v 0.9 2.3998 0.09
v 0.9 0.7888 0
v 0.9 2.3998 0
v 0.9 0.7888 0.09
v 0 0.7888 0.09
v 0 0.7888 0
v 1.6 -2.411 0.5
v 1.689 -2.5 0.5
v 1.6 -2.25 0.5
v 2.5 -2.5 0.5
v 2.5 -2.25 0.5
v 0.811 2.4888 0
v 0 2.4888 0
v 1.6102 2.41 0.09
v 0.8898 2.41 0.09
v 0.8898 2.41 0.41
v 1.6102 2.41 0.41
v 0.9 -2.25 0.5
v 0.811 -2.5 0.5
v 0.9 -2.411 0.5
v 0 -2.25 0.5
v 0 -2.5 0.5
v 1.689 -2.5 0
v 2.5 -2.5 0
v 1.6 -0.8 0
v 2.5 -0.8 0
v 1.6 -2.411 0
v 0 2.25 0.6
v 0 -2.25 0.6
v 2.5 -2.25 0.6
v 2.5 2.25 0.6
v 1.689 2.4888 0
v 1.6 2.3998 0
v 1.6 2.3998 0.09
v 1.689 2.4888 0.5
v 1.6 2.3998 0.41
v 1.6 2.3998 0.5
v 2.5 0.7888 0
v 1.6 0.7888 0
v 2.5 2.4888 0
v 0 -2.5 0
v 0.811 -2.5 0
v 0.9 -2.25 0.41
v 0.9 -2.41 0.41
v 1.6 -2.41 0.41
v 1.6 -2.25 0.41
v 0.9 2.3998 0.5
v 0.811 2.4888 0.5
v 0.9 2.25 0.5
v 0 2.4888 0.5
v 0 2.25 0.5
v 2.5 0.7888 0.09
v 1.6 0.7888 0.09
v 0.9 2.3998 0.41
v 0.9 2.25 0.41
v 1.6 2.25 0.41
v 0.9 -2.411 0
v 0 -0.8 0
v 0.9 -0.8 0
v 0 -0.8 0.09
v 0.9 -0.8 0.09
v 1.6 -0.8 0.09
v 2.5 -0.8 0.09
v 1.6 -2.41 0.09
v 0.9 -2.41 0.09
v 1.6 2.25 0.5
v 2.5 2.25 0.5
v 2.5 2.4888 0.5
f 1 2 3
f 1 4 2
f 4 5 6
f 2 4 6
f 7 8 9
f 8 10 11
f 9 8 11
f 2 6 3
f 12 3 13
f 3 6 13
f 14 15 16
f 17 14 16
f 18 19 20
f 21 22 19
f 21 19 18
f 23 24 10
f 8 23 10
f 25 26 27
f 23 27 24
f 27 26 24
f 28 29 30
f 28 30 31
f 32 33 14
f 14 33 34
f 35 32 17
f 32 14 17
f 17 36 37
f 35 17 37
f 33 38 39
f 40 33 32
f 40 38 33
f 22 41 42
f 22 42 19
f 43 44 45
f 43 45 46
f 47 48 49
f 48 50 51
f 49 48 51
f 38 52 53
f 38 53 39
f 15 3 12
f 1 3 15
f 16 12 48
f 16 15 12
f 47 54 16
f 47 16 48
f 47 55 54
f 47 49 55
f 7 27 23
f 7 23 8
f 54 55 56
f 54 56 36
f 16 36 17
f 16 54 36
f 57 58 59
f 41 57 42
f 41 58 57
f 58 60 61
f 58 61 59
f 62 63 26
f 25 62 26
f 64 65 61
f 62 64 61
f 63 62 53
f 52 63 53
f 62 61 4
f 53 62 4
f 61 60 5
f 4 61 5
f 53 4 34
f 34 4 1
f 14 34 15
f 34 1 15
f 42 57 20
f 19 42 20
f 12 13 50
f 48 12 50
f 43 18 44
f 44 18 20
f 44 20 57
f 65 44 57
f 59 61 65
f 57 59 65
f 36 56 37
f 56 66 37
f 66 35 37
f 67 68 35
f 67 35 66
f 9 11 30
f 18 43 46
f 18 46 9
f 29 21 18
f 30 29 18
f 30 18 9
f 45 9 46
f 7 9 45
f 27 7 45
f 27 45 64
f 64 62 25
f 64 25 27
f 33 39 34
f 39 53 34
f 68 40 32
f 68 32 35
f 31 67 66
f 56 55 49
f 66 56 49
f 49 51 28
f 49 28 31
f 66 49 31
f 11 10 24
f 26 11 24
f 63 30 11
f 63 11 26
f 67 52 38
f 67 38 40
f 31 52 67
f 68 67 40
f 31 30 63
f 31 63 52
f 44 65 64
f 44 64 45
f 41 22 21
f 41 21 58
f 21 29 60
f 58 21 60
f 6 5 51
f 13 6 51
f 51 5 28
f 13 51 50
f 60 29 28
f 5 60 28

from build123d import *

# Parameters (mm, degrees)
PAD002_DEPTH = 0.9
CHAMFER_SIZE = 0.089
SKETCH001_W  = 4.5
SKETCH001_H  = 0.19
PAD001_DEPTH = 2.5
SKETCH_W     = 4.82
SKETCH_H     = 0.32
PAD_DEPTH    = 2.5


with BuildPart() as body002:
    # Sketch002 → Pad002 (new body)
    with BuildSketch(Plane.YZ):
        Polygon((-2.25, 0.41), (-2.41, 0.41), (-2.41, 0.09), (-0.8, 0.09), (-0.8, 0), (-2.5, 0), (-2.5, 0.5), (-2.25, 0.5), align=None)
    extrude(amount=PAD002_DEPTH)

    # Chamfer
    chamfer_edges = [body002.edges().sort_by_distance(p)[0] for p in [
        (0.9, -2.5, 0.25),
    ]]
    chamfer(chamfer_edges, length=CHAMFER_SIZE)


with BuildPart() as mirror_of_body002:
    # mirror: instance of Body002
    add(body002.part.mirror(Plane(origin=(1.25, -2.25, 0.6), x_dir=(0, -1, 0), z_dir=(1, 0, 0))))


with BuildPart() as fusion:
    # Fusion base: copy of Body002
    add(body002.part)

    # Fusion: union Mirror of Body002
    add(mirror_of_body002.part)


with BuildPart() as mirror_of_fusion:
    # mirror001: instance of Fusion
    add(fusion.part.mirror(Plane(origin=(0.018654, -0.005609, 0.6), x_dir=(1, 0, 0), z_dir=(0, 1, 0))))


with BuildPart() as fusion001:
    # Fusion001 base: copy of Fusion
    add(fusion.part)

    # Fusion001: union Mirror of Fusion
    add(mirror_of_fusion.part)


with BuildPart() as fusion002:
    # Sketch001 → Pad001 (new body)
    with BuildSketch(Plane.YZ):
        with Locations((0, 0.505)):
            Rectangle(SKETCH001_W, SKETCH001_H)
    extrude(amount=PAD001_DEPTH)

    # Fusion002: union Fusion001
    add(fusion001.part)


with BuildPart() as lvk20:
    # Sketch → Pad (new body)
    with BuildSketch(Plane.YZ):
        with Locations((0, 0.25)):
            Rectangle(SKETCH_W, SKETCH_H)
    extrude(amount=PAD_DEPTH)

    # Fusion003: union Fusion002
    add(fusion002.part)


solid = lvk20.part
